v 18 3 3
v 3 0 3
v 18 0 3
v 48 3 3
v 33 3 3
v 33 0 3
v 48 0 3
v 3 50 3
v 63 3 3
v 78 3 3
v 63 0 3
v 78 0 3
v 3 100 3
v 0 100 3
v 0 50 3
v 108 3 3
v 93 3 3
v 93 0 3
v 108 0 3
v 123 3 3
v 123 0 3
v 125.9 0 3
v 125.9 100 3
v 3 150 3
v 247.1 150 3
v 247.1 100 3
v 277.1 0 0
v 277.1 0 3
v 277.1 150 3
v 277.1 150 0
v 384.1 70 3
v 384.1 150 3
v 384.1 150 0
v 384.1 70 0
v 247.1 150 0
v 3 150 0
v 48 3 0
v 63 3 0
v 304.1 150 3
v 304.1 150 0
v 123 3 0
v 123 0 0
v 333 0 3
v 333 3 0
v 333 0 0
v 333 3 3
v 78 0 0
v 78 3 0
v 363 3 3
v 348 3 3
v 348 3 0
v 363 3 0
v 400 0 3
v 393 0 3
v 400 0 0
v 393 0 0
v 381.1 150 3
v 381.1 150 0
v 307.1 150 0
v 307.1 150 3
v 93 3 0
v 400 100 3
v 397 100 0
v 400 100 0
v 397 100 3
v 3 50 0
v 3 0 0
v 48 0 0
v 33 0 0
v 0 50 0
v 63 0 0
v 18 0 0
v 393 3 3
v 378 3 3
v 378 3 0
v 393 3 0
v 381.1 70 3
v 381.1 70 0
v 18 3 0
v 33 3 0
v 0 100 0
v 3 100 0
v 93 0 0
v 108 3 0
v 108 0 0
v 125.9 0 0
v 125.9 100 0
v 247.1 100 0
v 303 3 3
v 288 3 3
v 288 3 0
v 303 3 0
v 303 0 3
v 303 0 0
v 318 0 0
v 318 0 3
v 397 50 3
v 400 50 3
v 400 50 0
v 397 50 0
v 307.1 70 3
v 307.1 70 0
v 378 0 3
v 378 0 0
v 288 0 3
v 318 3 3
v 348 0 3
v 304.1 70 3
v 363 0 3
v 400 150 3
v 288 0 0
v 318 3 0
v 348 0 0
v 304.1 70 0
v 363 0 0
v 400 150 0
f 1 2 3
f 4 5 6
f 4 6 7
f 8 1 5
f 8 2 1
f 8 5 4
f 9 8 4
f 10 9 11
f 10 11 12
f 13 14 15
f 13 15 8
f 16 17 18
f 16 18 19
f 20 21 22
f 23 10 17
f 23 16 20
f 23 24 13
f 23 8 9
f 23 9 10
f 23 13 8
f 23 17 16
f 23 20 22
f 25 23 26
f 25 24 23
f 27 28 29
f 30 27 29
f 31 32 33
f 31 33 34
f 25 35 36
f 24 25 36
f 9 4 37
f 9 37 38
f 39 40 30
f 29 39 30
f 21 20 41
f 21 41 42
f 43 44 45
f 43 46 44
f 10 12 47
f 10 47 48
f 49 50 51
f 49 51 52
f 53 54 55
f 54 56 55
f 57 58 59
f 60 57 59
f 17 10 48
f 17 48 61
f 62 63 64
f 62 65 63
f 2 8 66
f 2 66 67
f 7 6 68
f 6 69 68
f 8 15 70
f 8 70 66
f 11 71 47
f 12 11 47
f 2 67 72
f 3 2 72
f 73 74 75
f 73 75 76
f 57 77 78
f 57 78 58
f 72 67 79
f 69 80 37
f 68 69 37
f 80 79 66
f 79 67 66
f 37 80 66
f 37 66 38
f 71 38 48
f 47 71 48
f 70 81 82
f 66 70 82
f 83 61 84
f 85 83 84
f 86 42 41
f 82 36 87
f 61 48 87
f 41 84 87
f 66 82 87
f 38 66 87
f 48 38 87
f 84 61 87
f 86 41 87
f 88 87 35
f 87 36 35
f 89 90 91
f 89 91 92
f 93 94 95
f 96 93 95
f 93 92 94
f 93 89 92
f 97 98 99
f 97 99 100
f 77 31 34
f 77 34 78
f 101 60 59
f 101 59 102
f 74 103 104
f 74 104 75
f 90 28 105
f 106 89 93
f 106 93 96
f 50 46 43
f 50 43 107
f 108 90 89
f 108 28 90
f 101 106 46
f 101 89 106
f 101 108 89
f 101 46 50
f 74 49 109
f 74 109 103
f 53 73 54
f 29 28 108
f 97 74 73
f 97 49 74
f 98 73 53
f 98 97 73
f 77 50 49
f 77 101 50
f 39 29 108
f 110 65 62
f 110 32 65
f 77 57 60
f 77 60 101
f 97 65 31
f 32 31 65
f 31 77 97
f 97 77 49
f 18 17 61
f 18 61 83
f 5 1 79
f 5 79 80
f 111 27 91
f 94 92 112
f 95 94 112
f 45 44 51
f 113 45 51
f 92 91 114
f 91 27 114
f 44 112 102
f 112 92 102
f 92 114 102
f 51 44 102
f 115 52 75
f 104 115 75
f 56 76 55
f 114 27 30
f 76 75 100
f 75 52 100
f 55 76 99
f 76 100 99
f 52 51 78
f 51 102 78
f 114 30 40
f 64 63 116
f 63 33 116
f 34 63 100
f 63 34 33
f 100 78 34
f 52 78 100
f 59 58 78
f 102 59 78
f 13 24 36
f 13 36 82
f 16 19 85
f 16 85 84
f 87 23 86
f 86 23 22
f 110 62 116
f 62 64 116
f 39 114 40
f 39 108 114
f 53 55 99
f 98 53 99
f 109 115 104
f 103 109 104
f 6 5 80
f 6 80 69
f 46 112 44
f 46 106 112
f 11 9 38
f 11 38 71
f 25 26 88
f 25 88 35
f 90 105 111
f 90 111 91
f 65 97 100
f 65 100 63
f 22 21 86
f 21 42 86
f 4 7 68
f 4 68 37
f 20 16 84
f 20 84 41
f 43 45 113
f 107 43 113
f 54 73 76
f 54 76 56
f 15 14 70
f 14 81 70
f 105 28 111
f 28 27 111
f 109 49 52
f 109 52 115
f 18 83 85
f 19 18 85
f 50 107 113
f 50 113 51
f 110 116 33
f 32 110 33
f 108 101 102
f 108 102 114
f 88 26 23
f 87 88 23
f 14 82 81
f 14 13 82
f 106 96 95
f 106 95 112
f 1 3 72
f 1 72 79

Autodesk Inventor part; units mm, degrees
ref_plane "YZ Plane" through (0, 0, 0) normal (1, 0, 0) x (0, 1, 0)
ref_plane "XZ Plane" through (0, 0, 0) normal (0, 1, 0) x (-1, 0, 0)
ref_plane "XY Plane" through (0, 0, 0) normal (0, 0, 1) x (1, 0, 0)
sketch "Boceto1" plane through (0, 0, 0) normal (0, 0, 1) x (1, 0, 0)
  line L0 (0, 0) -> (400, 0)
  line L1 (400, 0) -> (400, 150)
  line L2 (400, 150) -> (0, 150)
  line L3 (0, 150) -> (0, 0)
  dimension "d0" = 150
  dimension "d1" = 400
extrude "Extrusión1" add sketch "Boceto1" along normal blind 3
sketch "Boceto3" plane through (0, 0, 3) normal (0, 0, 1) x (1, 0, 0)
  line L0 (0, 0) -> (400, 0) construction
  line L1 (400, 0) -> (400, 150) construction
  line L2 (400, 150) -> (0, 150) construction
  line L3 (0, 150) -> (0, 0) construction
  line L4 (0, 50) -> (3, 50)
  line L5 (3, 50) -> (3, 0)
  line L6 (3, 0) -> (0, 0)
  line L7 (0, 0) -> (0, 50)
  line L8 (0, 100) -> (0, 150)
  line L9 (0, 150) -> (3, 150)
  line L10 (3, 150) -> (3, 100)
  line L11 (3, 100) -> (0, 100)
  line L12 (397, 100) -> (400, 100)
  line L13 (400, 100) -> (400, 50)
  line L14 (400, 50) -> (397, 50)
  line L15 (397, 50) -> (397, 100)
  line L16 (400, 0) -> (400, 150) construction
  point P0 (400, 75)
  point P1 (400, 75)
  dimension "d15" = 3
  dimension "d16" = 50
  dimension "d19" = 100
  dimension "d24" = 3
  dimension "d25" = 50
extrude "Extrusión3" cut sketch "Boceto3" against normal blind 3
sketch "Boceto4" plane through (0, 0, 3) normal (0, 0, 1) x (1, 0, 0)
  line L0 (3, 150) -> (3, 100) construction
  line L1 (3, 100) -> (0, 100) construction
  line L2 (0, 100) -> (0, 50) construction
  line L3 (0, 50) -> (3, 50) construction
  line L4 (3, 50) -> (3, 0) construction
  line L5 (3, 0) -> (400, 0) construction
  line L6 (400, 0) -> (400, 50) construction
  line L7 (400, 50) -> (397, 50) construction
  line L8 (397, 50) -> (397, 100) construction
  line L9 (397, 100) -> (400, 100) construction
  line L10 (400, 100) -> (400, 150) construction
  line L11 (400, 150) -> (3, 150) construction
  line L12 (277.1, 100) -> (125.9, 100)
  line L13 (125.9, 100) -> (125.9, 0)
  line L14 (125.9, 0) -> (277.1, 0)
  line L15 (277.1, 0) -> (277.1, 100)
  line L16 (3, 0) -> (400, 0) construction
  point P0 (0, 0)
  point P1 (201.5, 0)
  point P2 (201.5, 0)
  dimension "d28" = 151.2
  dimension "d29" = 100
extrude "Extrusión4" cut sketch "Boceto4" against normal blind 10
sketch "Boceto5" plane through (0, 0, 3) normal (0, 0, 1) x (1, 0, 0)
  line L0 (277.1, 100) -> (277.1, 0) construction
  line L1 (277.1, 0) -> (400, 0) construction
  line L2 (400, 0) -> (400, 50) construction
  line L3 (400, 50) -> (397, 50) construction
  line L4 (397, 50) -> (397, 100) construction
  line L5 (397, 100) -> (400, 100) construction
  line L6 (400, 100) -> (400, 150) construction
  line L7 (400, 150) -> (3, 150) construction
  line L8 (3, 150) -> (3, 100) construction
  line L9 (3, 100) -> (0, 100) construction
  line L10 (0, 100) -> (0, 50) construction
  line L11 (0, 50) -> (3, 50) construction
  line L12 (3, 50) -> (3, 0) construction
  line L13 (3, 0) -> (125.9, 0) construction
  line L14 (125.9, 0) -> (125.9, 100) construction
  line L15 (125.9, 100) -> (277.1, 100) construction
  line L16 (304.1, 150) -> (307.1, 150)
  line L17 (307.1, 150) -> (307.1, 70)
  line L18 (307.1, 70) -> (304.1, 70)
  line L19 (304.1, 70) -> (304.1, 150)
  line L20 (381.1, 150) -> (384.1, 150)
  line L21 (384.1, 150) -> (384.1, 70)
  line L22 (384.1, 70) -> (381.1, 70)
  line L23 (381.1, 70) -> (381.1, 150)
  line L24 (400, 150) -> (3, 150) construction
  point P0 (0, 0)
  dimension "d32" = 3
  dimension "d33" = 3
  dimension "d34" = 74
  dimension "d35" = 27
  dimension "d36" = 80
  dimension "d37" = 80
extrude "Extrusión5" cut sketch "Boceto5" against normal blind 10
sketch "Boceto6" plane through (0, 0, 3) normal (0, 0, 1) x (1, 0, 0)
  line L0 (307.1, 150) -> (307.1, 70) construction
  line L1 (307.1, 70) -> (304.1, 70) construction
  line L2 (304.1, 70) -> (304.1, 150) construction
  line L3 (304.1, 150) -> (3, 150) construction
  line L4 (3, 150) -> (3, 100) construction
  line L5 (3, 100) -> (0, 100) construction
  line L6 (0, 100) -> (0, 50) construction
  line L7 (0, 50) -> (3, 50) construction
  line L8 (3, 50) -> (3, 0) construction
  line L9 (3, 0) -> (125.9, 0) construction
  line L10 (125.9, 0) -> (125.9, 100) construction
  line L11 (125.9, 100) -> (277.1, 100) construction
  line L12 (277.1, 100) -> (277.1, 0) construction
  line L13 (277.1, 0) -> (400, 0) construction
  line L14 (400, 0) -> (400, 50) construction
  line L15 (400, 50) -> (397, 50) construction
  line L16 (397, 50) -> (397, 100) construction
  line L17 (397, 100) -> (400, 100) construction
  line L18 (400, 100) -> (400, 150) construction
  line L19 (400, 150) -> (384.1, 150) construction
  line L20 (384.1, 150) -> (384.1, 70) construction
  line L21 (384.1, 70) -> (381.1, 70) construction
  line L22 (381.1, 70) -> (381.1, 150) construction
  line L23 (381.1, 150) -> (307.1, 150) construction
  line L24 (277.1, 100) -> (247.1, 100)
  line L25 (247.1, 100) -> (247.1, 150)
  line L26 (247.1, 150) -> (277.1, 150)
  line L27 (277.1, 150) -> (277.1, 100)
  line L28 (125.9, 100) -> (277.1, 100) construction
  line L29 (304.1, 150) -> (3, 150) construction
  line L30 (277.1, 100) -> (277.1, 0) construction
  point P0 (0, 0)
  dimension "d40" = 30
extrude "Extrusión6" cut sketch "Boceto6" against normal blind 10
sketch "Boceto7" plane through (0, 0, 3) normal (0, 0, 1) x (1, 0, 0)
  line L0 (247.1, 100) -> (247.1, 150) construction
  line L1 (247.1, 150) -> (3, 150) construction
  line L2 (3, 150) -> (3, 100) construction
  line L3 (3, 100) -> (0, 100) construction
  line L4 (0, 100) -> (0, 50) construction
  line L5 (0, 50) -> (3, 50) construction
  line L6 (3, 50) -> (3, 0) construction
  line L7 (3, 0) -> (125.9, 0) construction
  line L8 (125.9, 0) -> (125.9, 100) construction
  line L9 (125.9, 100) -> (247.1, 100) construction
  line L10 (277.1, 150) -> (277.1, 0) construction
  line L11 (277.1, 0) -> (400, 0) construction
  line L12 (400, 0) -> (400, 50) construction
  line L13 (400, 50) -> (397, 50) construction
  line L14 (397, 50) -> (397, 100) construction
  line L15 (397, 100) -> (400, 100) construction
  line L16 (400, 100) -> (400, 150) construction
  line L17 (400, 150) -> (384.1, 150) construction
  line L18 (384.1, 150) -> (384.1, 70) construction
  line L19 (384.1, 70) -> (381.1, 70) construction
  line L20 (381.1, 70) -> (381.1, 150) construction
  line L21 (381.1, 150) -> (307.1, 150) construction
  line L22 (307.1, 150) -> (307.1, 70) construction
  line L23 (307.1, 70) -> (304.1, 70) construction
  line L24 (304.1, 70) -> (304.1, 150) construction
  line L25 (304.1, 150) -> (277.1, 150) construction
  line L26 (18, 3) -> (33, 3)
  line L27 (33, 3) -> (33, 0)
  line L28 (33, 0) -> (18, 0)
  line L29 (18, 0) -> (18, 3)
  line L30 (3, 0) -> (125.9, 0) construction
  line L31 (63, 0) -> (48, 0)
  line L32 (63, 3) -> (63, 0)
  line L33 (48, 3) -> (63, 3)
  line L34 (48, 0) -> (48, 3)
  line L35 (93, 0) -> (78, 0)
  line L36 (93, 3) -> (93, 0)
  line L37 (78, 3) -> (93, 3)
  line L38 (78, 0) -> (78, 3)
  line L39 (123, 0) -> (108, 0)
  line L40 (123, 3) -> (123, 0)
  line L41 (108, 3) -> (123, 3)
  line L42 (108, 0) -> (108, 3)
  line L43 (153, 0) -> (138, 0)
  line L44 (153, 3) -> (153, 0)
  line L45 (138, 3) -> (153, 3)
  line L46 (138, 0) -> (138, 3)
  line L47 (183, 0) -> (168, 0)
  line L48 (183, 3) -> (183, 0)
  line L49 (168, 3) -> (183, 3)
  line L50 (168, 0) -> (168, 3)
  line L51 (213, 0) -> (198, 0)
  line L52 (213, 3) -> (213, 0)
  line L53 (198, 3) -> (213, 3)
  line L54 (198, 0) -> (198, 3)
  line L55 (243, 0) -> (228, 0)
  line L56 (243, 3) -> (243, 0)
  line L57 (228, 3) -> (243, 3)
  line L58 (228, 0) -> (228, 3)
  line L59 (273, 0) -> (258, 0)
  line L60 (273, 3) -> (273, 0)
  line L61 (258, 3) -> (273, 3)
  line L62 (258, 0) -> (258, 3)
  line L63 (303, 0) -> (288, 0)
  line L64 (303, 3) -> (303, 0)
  line L65 (288, 3) -> (303, 3)
  line L66 (288, 0) -> (288, 3)
  line L67 (333, 0) -> (318, 0)
  line L68 (333, 3) -> (333, 0)
  line L69 (318, 3) -> (333, 3)
  line L70 (318, 0) -> (318, 3)
  line L71 (363, 0) -> (348, 0)
  line L72 (363, 3) -> (363, 0)
  line L73 (348, 3) -> (363, 3)
  line L74 (348, 0) -> (348, 3)
  line L75 (393, 0) -> (378, 0)
  line L76 (393, 3) -> (393, 0)
  line L77 (378, 3) -> (393, 3)
  line L78 (378, 0) -> (378, 3)
  point P0 (0, 0)
  dimension "d43" = 15
  dimension "d44" = 3
  dimension "d45" = 15
  dimension "d53" = 30
extrude "Extrusión7" cut sketch "Boceto7" against normal blind 10
properties part number "ParedFrontal"
